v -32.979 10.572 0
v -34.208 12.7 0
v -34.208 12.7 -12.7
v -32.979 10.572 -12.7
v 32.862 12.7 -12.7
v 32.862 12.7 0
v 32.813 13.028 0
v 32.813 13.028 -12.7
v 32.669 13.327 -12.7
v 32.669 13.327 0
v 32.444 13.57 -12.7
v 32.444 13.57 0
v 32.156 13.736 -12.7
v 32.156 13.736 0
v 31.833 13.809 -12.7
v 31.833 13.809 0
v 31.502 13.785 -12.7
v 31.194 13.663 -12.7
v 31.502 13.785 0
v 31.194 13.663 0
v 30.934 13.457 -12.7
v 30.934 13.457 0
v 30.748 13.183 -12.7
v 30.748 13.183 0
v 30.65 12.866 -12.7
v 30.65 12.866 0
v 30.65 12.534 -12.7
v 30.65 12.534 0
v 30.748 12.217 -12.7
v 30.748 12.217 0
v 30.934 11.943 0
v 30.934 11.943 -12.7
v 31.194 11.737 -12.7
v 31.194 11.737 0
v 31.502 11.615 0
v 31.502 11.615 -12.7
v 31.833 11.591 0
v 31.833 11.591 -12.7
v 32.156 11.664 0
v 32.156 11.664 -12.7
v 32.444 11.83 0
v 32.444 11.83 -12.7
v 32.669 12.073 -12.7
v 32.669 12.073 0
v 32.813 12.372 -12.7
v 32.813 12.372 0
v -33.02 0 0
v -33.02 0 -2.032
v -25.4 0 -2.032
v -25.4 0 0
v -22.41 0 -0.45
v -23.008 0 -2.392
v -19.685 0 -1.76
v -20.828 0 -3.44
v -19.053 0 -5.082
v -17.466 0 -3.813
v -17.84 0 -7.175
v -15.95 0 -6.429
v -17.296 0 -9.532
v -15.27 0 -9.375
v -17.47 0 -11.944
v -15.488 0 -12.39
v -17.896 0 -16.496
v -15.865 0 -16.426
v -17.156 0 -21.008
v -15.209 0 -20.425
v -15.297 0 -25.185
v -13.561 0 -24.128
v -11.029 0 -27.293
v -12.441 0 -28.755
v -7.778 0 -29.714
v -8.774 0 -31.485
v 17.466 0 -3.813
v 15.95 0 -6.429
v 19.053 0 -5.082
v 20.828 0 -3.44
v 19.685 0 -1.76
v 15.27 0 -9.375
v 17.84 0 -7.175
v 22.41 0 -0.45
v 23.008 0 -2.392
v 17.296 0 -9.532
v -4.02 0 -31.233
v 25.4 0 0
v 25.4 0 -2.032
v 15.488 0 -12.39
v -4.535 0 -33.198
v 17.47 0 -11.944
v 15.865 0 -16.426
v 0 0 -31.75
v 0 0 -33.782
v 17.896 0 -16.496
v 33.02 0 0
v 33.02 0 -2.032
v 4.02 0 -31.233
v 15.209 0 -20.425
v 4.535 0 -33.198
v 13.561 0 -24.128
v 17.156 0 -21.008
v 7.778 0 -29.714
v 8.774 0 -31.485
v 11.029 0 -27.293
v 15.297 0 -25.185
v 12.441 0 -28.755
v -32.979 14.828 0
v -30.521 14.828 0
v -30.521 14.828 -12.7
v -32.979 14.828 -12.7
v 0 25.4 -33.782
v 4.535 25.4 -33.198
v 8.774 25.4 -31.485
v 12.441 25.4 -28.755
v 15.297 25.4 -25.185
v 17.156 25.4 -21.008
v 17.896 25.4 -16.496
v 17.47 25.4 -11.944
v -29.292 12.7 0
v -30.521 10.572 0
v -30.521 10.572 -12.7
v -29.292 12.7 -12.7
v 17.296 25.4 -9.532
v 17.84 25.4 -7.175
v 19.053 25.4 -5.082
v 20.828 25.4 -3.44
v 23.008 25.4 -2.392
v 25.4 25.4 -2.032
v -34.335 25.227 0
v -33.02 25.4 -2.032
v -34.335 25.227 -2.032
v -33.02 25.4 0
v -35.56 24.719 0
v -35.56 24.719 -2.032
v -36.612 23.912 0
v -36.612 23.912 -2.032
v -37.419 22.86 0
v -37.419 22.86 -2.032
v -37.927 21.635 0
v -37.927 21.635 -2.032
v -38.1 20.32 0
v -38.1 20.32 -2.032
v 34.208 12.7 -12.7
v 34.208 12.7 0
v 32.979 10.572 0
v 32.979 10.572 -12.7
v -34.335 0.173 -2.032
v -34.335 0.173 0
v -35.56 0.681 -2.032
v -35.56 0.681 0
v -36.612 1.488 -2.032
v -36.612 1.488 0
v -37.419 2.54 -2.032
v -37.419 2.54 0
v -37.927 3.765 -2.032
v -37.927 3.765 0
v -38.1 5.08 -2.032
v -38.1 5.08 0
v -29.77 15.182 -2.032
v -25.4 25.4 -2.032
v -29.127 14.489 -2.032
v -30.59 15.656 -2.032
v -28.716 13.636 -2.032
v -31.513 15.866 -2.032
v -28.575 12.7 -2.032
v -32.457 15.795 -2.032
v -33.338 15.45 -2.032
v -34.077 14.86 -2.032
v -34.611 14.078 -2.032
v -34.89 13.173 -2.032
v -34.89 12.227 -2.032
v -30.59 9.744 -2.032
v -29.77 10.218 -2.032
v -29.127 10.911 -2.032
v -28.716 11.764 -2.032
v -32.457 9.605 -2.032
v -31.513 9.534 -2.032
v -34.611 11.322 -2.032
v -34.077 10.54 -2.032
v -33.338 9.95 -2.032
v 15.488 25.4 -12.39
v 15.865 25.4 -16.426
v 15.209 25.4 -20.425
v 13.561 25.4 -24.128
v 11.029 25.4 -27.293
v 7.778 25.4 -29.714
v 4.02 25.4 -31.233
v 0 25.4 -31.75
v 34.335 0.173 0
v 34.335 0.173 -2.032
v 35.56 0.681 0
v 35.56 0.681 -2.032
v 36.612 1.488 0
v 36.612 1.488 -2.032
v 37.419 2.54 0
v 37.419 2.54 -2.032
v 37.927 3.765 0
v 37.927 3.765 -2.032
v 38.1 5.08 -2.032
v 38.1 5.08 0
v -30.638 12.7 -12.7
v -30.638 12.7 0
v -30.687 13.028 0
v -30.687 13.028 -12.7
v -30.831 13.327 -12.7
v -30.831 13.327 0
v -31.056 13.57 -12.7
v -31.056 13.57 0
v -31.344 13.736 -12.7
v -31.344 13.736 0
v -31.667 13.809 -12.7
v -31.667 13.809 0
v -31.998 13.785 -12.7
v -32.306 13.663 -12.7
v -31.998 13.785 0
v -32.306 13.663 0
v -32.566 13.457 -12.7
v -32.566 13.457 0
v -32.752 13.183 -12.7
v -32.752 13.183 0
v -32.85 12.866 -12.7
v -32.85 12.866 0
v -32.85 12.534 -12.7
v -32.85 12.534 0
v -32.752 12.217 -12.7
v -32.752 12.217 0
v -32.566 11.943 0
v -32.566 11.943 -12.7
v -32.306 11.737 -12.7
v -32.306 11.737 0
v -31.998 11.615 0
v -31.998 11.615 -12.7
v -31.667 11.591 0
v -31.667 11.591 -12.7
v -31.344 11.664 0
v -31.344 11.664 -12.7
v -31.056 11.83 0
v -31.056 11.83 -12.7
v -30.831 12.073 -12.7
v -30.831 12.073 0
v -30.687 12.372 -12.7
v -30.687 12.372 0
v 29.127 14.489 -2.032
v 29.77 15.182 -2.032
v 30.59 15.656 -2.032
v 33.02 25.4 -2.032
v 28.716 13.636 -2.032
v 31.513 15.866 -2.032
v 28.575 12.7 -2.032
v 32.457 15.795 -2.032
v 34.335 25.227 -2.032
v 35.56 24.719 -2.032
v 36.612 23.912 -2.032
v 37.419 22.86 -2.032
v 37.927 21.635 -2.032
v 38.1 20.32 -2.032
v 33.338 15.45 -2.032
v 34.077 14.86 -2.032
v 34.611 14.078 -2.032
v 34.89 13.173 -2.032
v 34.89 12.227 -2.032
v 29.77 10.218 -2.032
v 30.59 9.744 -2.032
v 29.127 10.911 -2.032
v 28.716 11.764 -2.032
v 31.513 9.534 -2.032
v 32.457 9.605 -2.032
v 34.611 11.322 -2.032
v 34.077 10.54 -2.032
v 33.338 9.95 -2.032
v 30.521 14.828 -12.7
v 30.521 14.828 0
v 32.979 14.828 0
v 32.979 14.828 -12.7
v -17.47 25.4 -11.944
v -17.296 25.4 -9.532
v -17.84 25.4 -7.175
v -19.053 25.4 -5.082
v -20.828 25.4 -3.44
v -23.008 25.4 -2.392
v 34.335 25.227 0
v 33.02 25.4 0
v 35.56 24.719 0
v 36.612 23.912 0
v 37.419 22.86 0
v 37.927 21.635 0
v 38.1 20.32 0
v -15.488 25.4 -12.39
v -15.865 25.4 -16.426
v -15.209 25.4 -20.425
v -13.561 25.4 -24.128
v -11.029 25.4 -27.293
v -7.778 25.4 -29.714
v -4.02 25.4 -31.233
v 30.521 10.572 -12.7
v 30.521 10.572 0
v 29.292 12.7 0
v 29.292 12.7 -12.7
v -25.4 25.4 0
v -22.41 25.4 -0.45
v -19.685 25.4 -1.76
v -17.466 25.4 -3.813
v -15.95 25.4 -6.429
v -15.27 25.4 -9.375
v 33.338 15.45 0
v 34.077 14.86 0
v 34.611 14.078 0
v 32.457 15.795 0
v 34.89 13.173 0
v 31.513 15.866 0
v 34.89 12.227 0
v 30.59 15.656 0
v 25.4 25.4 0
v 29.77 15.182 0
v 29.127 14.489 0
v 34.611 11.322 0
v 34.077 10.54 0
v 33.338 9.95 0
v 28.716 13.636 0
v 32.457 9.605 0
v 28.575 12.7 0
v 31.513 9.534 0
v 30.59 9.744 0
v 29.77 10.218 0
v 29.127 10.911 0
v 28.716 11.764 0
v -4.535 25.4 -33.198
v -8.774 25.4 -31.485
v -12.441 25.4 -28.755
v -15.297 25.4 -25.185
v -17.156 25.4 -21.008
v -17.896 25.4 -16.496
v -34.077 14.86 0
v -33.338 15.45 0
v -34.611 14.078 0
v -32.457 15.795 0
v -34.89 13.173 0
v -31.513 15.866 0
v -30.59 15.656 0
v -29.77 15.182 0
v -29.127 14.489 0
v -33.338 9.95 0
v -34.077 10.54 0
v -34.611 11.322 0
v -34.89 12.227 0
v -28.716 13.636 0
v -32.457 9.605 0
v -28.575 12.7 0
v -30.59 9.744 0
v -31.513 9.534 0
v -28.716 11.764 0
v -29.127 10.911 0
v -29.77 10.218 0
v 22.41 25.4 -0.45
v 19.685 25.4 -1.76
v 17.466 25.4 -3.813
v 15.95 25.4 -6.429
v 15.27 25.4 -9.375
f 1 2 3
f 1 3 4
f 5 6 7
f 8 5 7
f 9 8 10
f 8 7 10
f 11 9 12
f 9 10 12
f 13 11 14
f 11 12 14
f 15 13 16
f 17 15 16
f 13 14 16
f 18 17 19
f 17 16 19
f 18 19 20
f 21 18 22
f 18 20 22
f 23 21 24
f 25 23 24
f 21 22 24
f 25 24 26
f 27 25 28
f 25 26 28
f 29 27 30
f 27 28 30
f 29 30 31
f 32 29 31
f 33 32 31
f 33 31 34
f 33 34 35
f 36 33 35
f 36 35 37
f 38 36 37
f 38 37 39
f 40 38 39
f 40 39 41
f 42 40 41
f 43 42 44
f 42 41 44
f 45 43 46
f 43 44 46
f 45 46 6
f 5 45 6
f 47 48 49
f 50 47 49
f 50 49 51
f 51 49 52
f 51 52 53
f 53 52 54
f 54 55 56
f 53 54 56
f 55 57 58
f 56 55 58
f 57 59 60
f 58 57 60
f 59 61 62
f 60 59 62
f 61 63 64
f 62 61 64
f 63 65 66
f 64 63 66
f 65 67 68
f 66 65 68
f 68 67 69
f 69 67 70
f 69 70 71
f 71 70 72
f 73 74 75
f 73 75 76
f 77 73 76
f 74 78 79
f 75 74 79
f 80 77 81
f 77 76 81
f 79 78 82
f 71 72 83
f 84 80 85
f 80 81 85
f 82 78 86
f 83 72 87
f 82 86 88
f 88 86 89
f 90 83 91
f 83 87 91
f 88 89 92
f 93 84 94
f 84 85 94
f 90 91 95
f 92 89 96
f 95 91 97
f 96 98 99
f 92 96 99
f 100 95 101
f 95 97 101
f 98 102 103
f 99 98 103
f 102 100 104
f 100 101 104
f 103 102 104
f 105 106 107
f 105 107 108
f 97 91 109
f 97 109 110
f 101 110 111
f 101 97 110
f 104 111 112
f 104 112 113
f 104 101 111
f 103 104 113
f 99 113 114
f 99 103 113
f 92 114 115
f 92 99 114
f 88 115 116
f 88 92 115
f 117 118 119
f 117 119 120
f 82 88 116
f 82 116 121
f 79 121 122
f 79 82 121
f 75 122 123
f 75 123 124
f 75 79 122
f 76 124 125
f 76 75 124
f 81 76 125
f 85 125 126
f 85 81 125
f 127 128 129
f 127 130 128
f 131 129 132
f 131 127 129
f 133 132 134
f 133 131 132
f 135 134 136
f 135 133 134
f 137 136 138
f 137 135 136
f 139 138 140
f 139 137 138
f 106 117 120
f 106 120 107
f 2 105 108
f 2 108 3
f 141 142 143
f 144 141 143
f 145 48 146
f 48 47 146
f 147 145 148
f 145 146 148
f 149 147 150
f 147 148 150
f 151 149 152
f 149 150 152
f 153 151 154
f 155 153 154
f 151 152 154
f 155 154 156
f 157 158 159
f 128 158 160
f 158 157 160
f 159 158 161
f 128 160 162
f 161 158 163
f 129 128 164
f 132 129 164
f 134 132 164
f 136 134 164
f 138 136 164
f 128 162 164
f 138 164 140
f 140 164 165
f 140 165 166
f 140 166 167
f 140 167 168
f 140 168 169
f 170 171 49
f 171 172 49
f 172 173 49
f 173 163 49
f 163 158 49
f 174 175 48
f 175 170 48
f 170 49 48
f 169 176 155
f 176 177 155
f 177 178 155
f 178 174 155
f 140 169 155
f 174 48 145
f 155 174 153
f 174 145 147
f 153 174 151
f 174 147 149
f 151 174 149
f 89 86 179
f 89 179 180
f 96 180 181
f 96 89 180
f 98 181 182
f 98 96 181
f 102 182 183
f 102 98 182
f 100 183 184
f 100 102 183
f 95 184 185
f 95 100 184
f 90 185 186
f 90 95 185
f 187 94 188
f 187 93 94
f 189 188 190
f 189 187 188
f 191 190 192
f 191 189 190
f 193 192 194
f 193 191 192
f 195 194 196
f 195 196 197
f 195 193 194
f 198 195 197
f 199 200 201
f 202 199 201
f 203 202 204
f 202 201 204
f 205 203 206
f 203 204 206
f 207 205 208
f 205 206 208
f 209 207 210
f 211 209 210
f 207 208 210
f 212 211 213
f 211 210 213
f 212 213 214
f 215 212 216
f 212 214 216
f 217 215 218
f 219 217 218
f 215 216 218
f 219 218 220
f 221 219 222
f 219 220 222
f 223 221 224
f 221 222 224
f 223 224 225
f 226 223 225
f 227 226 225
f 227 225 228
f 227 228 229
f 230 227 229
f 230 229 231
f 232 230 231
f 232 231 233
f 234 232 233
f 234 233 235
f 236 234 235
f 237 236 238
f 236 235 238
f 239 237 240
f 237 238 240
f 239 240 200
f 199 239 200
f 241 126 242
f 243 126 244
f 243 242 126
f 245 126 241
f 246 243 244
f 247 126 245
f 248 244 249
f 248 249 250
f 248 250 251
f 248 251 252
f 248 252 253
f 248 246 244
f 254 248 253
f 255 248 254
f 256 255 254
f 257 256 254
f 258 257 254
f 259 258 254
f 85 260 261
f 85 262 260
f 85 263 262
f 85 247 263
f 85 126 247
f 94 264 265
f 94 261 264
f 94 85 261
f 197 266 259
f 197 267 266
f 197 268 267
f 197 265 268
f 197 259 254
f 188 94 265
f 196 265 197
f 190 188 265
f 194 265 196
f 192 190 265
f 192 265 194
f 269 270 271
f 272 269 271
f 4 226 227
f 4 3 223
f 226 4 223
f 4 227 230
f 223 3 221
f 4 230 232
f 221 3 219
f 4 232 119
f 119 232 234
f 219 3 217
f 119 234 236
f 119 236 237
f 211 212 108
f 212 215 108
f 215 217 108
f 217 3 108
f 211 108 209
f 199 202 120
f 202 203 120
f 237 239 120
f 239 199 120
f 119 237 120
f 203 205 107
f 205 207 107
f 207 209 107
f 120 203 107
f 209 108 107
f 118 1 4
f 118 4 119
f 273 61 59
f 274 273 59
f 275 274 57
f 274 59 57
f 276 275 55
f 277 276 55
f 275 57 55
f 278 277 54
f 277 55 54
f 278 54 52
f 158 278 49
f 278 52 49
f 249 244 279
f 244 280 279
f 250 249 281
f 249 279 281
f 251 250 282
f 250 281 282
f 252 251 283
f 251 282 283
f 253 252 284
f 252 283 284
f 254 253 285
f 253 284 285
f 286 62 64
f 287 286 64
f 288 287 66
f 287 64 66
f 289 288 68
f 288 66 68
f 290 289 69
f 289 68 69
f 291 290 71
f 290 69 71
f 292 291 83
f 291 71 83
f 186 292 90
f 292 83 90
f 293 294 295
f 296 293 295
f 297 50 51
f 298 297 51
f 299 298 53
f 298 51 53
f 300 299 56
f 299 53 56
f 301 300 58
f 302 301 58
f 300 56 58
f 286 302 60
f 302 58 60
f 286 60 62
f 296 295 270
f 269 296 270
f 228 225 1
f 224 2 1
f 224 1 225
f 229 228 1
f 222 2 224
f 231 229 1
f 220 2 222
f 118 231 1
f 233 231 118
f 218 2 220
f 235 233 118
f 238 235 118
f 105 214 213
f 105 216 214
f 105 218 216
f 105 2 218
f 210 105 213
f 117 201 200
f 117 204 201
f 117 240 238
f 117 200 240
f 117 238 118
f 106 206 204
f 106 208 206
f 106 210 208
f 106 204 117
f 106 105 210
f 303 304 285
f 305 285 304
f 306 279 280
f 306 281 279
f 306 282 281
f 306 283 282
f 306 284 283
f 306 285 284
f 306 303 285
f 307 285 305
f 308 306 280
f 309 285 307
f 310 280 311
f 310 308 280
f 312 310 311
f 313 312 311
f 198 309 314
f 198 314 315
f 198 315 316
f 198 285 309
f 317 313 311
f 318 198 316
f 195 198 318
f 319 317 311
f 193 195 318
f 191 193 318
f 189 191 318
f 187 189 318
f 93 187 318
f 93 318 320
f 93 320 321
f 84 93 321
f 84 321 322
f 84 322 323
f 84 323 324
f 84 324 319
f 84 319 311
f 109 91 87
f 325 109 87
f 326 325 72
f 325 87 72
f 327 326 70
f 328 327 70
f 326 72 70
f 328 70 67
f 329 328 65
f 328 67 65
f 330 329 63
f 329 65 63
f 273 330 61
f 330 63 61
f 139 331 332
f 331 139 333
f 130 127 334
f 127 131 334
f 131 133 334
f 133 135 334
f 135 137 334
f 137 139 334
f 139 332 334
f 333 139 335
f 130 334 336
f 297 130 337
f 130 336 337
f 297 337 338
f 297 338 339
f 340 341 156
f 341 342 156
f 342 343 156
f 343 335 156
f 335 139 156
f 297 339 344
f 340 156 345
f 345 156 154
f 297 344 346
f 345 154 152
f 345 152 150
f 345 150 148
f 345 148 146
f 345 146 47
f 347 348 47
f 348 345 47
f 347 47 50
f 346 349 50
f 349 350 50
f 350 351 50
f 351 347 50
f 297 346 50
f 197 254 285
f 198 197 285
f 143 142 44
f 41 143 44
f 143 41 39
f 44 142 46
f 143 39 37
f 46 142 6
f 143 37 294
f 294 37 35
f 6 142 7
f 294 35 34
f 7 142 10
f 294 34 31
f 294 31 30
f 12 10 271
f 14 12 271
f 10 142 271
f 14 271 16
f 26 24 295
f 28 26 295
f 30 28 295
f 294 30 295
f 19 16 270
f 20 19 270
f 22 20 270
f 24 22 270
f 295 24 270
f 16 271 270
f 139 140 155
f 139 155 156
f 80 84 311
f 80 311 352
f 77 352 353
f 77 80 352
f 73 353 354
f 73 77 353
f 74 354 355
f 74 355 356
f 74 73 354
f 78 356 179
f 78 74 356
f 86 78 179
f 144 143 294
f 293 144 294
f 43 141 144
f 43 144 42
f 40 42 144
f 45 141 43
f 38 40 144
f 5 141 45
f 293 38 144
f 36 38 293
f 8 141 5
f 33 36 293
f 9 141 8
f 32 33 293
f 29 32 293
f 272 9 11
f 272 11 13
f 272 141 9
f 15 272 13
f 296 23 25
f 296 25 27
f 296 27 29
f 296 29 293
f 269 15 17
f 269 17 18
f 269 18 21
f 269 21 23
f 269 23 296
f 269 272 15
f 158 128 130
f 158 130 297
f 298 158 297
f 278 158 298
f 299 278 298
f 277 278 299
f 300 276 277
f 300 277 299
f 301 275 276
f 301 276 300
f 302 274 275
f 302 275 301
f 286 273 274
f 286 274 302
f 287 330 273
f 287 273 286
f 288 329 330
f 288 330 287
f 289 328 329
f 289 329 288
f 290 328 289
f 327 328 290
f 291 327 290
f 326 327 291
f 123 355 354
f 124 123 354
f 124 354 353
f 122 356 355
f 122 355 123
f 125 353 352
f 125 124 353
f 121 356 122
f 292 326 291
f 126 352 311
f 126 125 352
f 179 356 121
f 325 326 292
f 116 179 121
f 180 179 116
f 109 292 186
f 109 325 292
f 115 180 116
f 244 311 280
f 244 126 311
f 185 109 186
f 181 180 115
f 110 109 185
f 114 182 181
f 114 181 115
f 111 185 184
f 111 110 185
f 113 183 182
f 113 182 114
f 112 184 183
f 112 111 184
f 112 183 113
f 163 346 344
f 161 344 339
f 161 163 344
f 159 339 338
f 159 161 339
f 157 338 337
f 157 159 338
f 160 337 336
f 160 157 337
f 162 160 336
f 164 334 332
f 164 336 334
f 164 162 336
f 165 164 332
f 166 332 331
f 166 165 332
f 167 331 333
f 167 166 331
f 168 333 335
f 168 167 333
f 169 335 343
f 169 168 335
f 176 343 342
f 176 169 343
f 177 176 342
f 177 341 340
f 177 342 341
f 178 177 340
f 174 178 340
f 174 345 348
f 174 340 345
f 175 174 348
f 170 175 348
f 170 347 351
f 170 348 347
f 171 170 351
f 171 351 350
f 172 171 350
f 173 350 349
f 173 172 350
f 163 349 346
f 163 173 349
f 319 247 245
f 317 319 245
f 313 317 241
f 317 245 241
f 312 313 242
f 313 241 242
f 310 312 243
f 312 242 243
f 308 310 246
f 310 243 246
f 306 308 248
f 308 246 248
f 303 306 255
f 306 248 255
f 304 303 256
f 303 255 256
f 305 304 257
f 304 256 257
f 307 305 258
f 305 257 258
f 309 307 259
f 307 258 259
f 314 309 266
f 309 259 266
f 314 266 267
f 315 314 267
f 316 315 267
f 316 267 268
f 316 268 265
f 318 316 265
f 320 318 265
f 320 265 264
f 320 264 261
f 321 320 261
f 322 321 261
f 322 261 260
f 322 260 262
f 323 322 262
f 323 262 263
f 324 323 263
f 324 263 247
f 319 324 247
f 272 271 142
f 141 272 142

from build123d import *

# Parameters (mm, degrees)
BOSS_EXTRUDE1_DEPTH   = 25.4
FILLET1_R             = 5.08
SKETCH2_R             = 3.175
CUT_EXTRUDE1_DEPTH    = 3.032
SKETCH4_R             = 1.112492688
BOSS_EXTRUDE2_DEPTH   = 12.7
BOSS_EXTRUDE2_2_DEPTH = 12.7


with BuildPart() as part:
    # Sketch1 → Boss-Extrude1 (new body)
    with BuildSketch(Plane(origin=(0, 0, 0), x_dir=(1, 0, 0), z_dir=(0, 1, 0))):
        with BuildLine():
            Line((0, 31.75), (0, 33.782))
            ThreePointArc((0, 33.782), (13.983017771, 27.061414217), (17.470243902, 11.944195122))
            ThreePointArc((17.470243902, 11.944195122), (19.053098317, 5.082478653), (25.4, 2.032))
            Line((25.4, 2.032), (38.1, 2.032))
            Line((38.1, 2.032), (38.1, 0))
            Line((38.1, 0), (25.4, 0))
            ThreePointArc((25.4, 0), (17.466372896, 3.813098317), (15.487804878, 12.390243902))
            ThreePointArc((15.487804878, 12.390243902), (12.39629235, 25.79203388), (0, 31.75))
        make_face()
    boss_extrude1 = extrude(amount=BOSS_EXTRUDE1_DEPTH)

    # Mirror2: Boss-Extrude1 across plane
    add(boss_extrude1.mirror(Plane(origin=(0, 0, 0), x_dir=(0, 0, 1), z_dir=(1, 0, 0))))

    # Fillet1
    fillet1_edges = [part.edges().sort_by_distance(p)[0] for p in [
        (38.1, 25.4, -1.016),
        (-38.1, 25.4, -1.016),
        (-38.1, 0, -1.016),
        (38.1, 0, -1.016),
    ]]
    fillet(fillet1_edges, radius=FILLET1_R)

    # Sketch2 → Cut-Extrude1 (cut, through all)
    with BuildSketch(Plane(origin=(0, 0, -2.032), x_dir=(-1, 0, 0), z_dir=(0, 0, -1))):
        with Locations((-31.75, 12.7)):
            Circle(SKETCH2_R)
    cut_extrude1 = extrude(amount=-CUT_EXTRUDE1_DEPTH, mode=Mode.SUBTRACT)

    # Mirror1: Cut-Extrude1 across plane
    add(cut_extrude1.mirror(Plane(origin=(0, 0, 0), x_dir=(0, 0, 1), z_dir=(1, 0, 0))), mode=Mode.SUBTRACT)


with BuildPart() as body_2:
    # Sketch4 → Boss-Extrude2 (new body)
    with BuildSketch(Plane.XY):
        Polygon((-29.292228347, 12.7), (-30.521114173, 14.828492688), (-32.978885827, 14.828492688), (-34.207771653, 12.7), (-32.978885827, 10.571507312), (-30.521114173, 10.571507312), align=None)
        with Locations((-31.75, 12.7)):
            Circle(SKETCH4_R, mode=Mode.SUBTRACT)
    extrude(amount=-BOSS_EXTRUDE2_DEPTH)


with BuildPart() as body_3:
    # Sketch4 → Boss-Extrude2 2 (new body)
    with BuildSketch(Plane.XY):
        Polygon((30.521114173, 10.571507312), (29.292228347, 12.7), (30.521114173, 14.828492688), (32.978885827, 14.828492688), (34.207771653, 12.7), (32.978885827, 10.571507312), align=None)
        with Locations((31.75, 12.7)):
            Circle(SKETCH4_R, mode=Mode.SUBTRACT)
    extrude(amount=-BOSS_EXTRUDE2_2_DEPTH)


solid = Compound([part.part, body_2.part, body_3.part])
